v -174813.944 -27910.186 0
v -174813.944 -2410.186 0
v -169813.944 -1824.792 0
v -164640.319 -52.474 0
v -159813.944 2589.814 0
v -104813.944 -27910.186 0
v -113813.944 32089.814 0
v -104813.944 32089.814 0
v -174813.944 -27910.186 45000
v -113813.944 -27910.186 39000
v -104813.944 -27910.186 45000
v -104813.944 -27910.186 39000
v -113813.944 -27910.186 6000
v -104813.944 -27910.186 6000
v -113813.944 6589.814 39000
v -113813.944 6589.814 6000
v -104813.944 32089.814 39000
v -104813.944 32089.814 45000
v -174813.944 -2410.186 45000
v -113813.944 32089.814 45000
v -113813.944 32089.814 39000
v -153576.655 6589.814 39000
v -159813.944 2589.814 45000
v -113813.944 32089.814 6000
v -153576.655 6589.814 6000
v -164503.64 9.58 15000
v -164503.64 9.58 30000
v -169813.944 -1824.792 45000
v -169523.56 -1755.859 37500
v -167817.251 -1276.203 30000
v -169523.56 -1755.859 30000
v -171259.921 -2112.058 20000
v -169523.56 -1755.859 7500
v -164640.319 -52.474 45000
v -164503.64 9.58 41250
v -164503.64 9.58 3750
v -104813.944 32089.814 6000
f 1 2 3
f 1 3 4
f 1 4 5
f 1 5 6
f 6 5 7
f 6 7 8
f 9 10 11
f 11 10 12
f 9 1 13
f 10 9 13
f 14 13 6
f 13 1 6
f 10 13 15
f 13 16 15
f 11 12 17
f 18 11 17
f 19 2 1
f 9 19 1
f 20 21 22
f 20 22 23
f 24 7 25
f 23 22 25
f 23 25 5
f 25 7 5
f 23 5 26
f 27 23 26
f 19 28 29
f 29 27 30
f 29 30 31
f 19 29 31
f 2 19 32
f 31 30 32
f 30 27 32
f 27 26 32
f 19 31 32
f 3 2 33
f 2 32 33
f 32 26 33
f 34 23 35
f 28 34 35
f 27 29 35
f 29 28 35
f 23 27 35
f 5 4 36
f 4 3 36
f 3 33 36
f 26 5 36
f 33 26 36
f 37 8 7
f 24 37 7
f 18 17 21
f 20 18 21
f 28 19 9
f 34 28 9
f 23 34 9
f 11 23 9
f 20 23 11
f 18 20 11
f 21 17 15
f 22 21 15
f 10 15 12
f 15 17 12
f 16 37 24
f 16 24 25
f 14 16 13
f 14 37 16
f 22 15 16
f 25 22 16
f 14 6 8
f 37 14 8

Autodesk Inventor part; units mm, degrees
ref_plane "YZ Plane" through (0, 0, 0) normal (1, 0, 0) x (0, 1, 0)
ref_plane "XZ Plane" through (0, 0, 0) normal (0, 1, 0) x (-1, 0, 0)
ref_plane "XY Plane" through (0, 0, 0) normal (0, 0, 1) x (1, 0, 0)
sketch "スケッチ1" plane through (0, 0, 0) normal (0, 0, 1) x (1, 0, 0)
  line L0 (-174813.9436, -2410.1862) -> (-174813.9436, -27910.1862)
  line L1 (-174813.9436, -27910.1862) -> (-104813.9436, -27910.1862)
  line L2 (-104813.9436, -27910.1862) -> (-104813.9436, 32089.8138)
  line L3 (-104813.9436, 32089.8138) -> (-113813.9436, 32089.8138)
  line L4 (-113813.9436, 32089.8138) -> (-159813.9436, 2589.8138)
  spline S0 degree 3 poles (-159813.9436, 2589.8138) (-164318.6072, -299.0466) (-169408.2494, -2410.1862) (-174813.9436, -2410.1862) knots 0 0 0 0 1 1 1 1
  point P0 (0, 0)
  dimension "d0" = 70000
  dimension "d1" = 25500
  dimension "d2" = 5000
  dimension "d3" = 9000
  dimension "d4" = 15000
  dimension "d5" = 60000
extrude "押し出し1" add sketch "スケッチ1" along normal blind 45000
sketch "スケッチ2" plane through (-104813.9436, -27910.1862, 0) normal (1, 0, 0) x (0, 0, -1)
  point P0 (0, 27910.1862)
sketch "スケッチ3" plane through (-113813.9436, 32089.8138, 0) normal (0, 1, 0) x (1, 0, 0)
  line L0 (9000, 0) -> (0, 0) projected
  line L1 (0, 0) -> (0, -45000) projected
  line L2 (9000, -45000) -> (0, -45000) projected
  line L3 (9000, 0) -> (9000, -45000) projected
  line L4 (9000, -39000) -> (0, -39000)
  line L5 (0, -39000) -> (0, -6000)
  line L6 (0, -6000) -> (9000, -6000)
  line L7 (9000, -6000) -> (9000, -39000)
  point P0 (113813.9436, 0)
  dimension "d8" = 33000
  dimension "d9" = 6000
extrude "押し出し2" cut sketch "スケッチ3" against normal blind 60000 contours L3 L4 L1 L6
sketch "スケッチ4" plane through (-104813.9436, -27910.1862, 0) normal (1, 0, 0) x (0, 0, -1)
  line L0 (-6000, 60000) -> (-6000, 0) projected
  line L1 (0, 0) -> (-6000, 0) projected
  line L2 (0, 0) -> (0, 60000) projected
  line L3 (0, 60000) -> (-6000, 60000) projected
  line L4 (-6000, 60000) -> (-39000, 60000) projected
  line L5 (-39000, 60000) -> (-39000, 0) projected
  line L6 (-6000, 0) -> (-39000, 0) projected
  line L7 (-6000, 60000) -> (-6000, 0) projected
  line L8 (-39000, 0) -> (-39000, 60000) projected
  line L9 (-39000, 60000) -> (-45000, 60000) projected
  line L10 (-45000, 0) -> (-45000, 60000) projected
  line L11 (-39000, 0) -> (-45000, 0) projected
  line L12 (-6000, 60000) -> (-39000, 60000)
  line L13 (-39000, 60000) -> (-39000, 34500)
  line L14 (-39000, 34500) -> (-6000, 34500)
  line L15 (-6000, 34500) -> (-6000, 60000)
  point P0 (0, 27910.1862)
  dimension "d12" = 34500
extrude "押し出し3" cut sketch "スケッチ4" against normal blind 60000 contours L0 L14 L5 L4
sketch "スケッチ5" plane through (-174813.9436, -27910.1862, 0) normal (0, -1, 0) x (1, 0, 0)
  line L0 (70000, 6000) -> (61000, 6000) projected
  line L1 (61000, 6000) -> (61000, 39000) projected
  line L2 (61000, 39000) -> (70000, 39000) projected
  line L3 (70000, 39000) -> (70000, 45000) projected
  line L4 (0, 45000) -> (70000, 45000) projected
  line L5 (0, 0) -> (0, 45000) projected
  line L6 (0, 0) -> (70000, 0) projected
  line L7 (70000, 0) -> (70000, 6000) projected
  arc A0 (0, 5000) -> (5000, 0) centre (5000, 5000) ccw
  arc A1 (5000, 45000) -> (0, 40000) centre (5000, 40000) ccw
  point P0 (174813.9436, 0)
  dimension "d15" = 5000
extrude "押し出し4" cut sketch "スケッチ5" against normal blind 100000 contours L6 L5 A0 | L5 L4 A1
properties part number "anchorage"
